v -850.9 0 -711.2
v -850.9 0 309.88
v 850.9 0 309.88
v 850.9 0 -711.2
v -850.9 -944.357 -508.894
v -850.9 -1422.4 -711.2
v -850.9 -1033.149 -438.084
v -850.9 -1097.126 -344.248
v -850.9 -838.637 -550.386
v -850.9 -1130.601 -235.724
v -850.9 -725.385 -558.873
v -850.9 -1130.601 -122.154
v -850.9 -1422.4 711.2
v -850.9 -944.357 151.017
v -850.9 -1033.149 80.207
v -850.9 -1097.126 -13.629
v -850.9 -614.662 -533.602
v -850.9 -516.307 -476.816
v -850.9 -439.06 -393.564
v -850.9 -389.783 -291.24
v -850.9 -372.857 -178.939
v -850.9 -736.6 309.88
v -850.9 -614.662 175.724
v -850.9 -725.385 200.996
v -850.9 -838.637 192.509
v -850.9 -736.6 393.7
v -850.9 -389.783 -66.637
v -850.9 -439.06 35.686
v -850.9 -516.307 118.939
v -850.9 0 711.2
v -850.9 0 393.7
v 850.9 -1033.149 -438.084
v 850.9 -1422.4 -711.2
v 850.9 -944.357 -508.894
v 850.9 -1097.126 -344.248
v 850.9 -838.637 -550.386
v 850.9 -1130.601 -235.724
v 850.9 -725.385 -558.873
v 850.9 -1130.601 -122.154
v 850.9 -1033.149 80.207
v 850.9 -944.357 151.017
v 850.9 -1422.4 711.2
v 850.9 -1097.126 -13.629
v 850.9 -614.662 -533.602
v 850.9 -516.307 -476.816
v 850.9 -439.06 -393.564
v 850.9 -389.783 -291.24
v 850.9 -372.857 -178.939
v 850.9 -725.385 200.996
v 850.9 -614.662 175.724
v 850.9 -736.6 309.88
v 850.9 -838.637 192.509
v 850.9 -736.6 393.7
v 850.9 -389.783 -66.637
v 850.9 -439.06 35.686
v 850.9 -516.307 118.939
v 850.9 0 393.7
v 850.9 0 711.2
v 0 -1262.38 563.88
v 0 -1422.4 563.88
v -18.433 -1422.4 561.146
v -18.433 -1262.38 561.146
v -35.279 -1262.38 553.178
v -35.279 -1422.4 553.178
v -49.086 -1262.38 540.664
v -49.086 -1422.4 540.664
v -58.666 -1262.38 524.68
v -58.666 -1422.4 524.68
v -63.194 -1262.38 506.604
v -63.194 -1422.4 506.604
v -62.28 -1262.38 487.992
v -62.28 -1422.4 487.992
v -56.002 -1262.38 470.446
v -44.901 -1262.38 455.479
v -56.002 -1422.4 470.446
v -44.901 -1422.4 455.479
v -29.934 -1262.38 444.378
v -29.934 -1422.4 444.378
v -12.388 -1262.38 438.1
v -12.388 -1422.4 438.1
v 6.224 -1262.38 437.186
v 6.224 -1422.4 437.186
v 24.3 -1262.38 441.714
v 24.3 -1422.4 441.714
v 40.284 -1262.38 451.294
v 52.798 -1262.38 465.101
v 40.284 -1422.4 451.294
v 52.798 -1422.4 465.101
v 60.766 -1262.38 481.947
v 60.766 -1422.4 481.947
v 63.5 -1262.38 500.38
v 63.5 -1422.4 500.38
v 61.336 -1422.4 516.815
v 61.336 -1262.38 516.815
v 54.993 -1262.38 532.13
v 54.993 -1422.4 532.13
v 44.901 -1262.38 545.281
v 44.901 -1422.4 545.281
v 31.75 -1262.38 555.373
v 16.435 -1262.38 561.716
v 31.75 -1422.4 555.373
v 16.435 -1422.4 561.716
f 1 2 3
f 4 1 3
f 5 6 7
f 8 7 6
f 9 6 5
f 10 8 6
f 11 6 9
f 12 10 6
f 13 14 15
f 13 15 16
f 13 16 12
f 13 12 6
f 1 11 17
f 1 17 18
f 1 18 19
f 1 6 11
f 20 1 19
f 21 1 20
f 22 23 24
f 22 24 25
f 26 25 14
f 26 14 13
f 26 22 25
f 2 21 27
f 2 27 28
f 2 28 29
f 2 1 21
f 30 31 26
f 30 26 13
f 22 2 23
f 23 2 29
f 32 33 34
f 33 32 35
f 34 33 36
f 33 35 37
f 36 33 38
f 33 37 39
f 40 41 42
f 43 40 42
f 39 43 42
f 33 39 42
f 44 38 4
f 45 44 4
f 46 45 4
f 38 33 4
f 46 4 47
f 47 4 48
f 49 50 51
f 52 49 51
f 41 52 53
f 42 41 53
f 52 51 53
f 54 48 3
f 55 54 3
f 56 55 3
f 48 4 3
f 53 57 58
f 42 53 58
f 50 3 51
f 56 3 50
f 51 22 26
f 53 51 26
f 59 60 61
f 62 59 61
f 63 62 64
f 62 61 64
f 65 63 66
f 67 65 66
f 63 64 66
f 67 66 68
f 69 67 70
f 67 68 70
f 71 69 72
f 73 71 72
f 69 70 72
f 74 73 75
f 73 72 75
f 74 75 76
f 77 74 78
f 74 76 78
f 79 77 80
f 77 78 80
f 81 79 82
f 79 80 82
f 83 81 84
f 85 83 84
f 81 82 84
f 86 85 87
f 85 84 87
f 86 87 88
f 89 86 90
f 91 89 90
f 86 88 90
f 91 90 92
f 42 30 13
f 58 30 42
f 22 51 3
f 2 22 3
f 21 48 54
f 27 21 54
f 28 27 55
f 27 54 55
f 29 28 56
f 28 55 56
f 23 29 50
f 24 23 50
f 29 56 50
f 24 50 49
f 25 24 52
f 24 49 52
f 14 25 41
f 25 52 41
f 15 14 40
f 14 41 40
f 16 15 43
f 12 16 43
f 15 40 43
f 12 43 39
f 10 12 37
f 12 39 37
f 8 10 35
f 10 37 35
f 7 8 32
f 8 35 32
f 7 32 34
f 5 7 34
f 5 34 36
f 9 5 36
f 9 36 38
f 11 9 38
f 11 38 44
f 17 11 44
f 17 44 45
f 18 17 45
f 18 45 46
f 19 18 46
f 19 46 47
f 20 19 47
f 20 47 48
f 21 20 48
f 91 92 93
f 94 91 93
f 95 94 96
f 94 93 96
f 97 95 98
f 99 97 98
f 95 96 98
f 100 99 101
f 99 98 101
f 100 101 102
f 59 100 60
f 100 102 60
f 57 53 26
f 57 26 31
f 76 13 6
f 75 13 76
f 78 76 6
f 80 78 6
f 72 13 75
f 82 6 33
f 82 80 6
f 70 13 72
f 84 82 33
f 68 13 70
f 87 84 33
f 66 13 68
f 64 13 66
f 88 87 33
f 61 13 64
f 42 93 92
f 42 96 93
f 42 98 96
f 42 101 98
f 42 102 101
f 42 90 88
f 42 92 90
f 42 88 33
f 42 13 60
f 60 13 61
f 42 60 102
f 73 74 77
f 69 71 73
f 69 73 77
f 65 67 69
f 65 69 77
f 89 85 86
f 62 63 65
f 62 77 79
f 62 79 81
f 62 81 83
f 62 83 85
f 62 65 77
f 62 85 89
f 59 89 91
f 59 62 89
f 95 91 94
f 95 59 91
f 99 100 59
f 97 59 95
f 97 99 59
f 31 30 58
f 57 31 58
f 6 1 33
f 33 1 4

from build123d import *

# Parameters (mm, degrees)
F0_W     = 1701.8
F0_H     = 1422.4
F1_DEPTH = 1422.4
F3_DEPTH = 160.02
F4_W     = 736.6
F4_H     = 83.82
F5_DEPTH = 1701.8
F6_R     = 381
F7_DEPTH = 3035.3


with BuildPart() as f1:
    # F0 (on Front) → F1 (new body)
    with BuildSketch(Plane.XZ):
        Rectangle(F0_W, F0_H)
    extrude(amount=F1_DEPTH)

    # F2 (on face) → F3 (cut)
    with BuildSketch(Plane.XZ.offset(1422.4)):
        with BuildLine():
            ThreePointArc((63.5, 500.38), (44.901281, 545.281281), (0, 563.88))
            ThreePointArc((0, 563.88), (-44.901281, 455.478719), (63.5, 500.38))
        make_face()
    extrude(amount=-F3_DEPTH, mode=Mode.SUBTRACT)

    # F4 (on face) → F5 (cut)
    with BuildSketch(Plane.YZ.offset(850.9)):
        with Locations((-368.3, 351.79)):
            Rectangle(F4_W, F4_H)
    extrude(amount=-F5_DEPTH, mode=Mode.SUBTRACT)

    # F6 (on face) → F7 (cut)
    with BuildSketch(Plane.YZ.offset(850.9)):
        with Locations((-753.856719, -178.938612)):
            Circle(F6_R)
    extrude(amount=-F7_DEPTH, mode=Mode.SUBTRACT)


solid = f1.part
